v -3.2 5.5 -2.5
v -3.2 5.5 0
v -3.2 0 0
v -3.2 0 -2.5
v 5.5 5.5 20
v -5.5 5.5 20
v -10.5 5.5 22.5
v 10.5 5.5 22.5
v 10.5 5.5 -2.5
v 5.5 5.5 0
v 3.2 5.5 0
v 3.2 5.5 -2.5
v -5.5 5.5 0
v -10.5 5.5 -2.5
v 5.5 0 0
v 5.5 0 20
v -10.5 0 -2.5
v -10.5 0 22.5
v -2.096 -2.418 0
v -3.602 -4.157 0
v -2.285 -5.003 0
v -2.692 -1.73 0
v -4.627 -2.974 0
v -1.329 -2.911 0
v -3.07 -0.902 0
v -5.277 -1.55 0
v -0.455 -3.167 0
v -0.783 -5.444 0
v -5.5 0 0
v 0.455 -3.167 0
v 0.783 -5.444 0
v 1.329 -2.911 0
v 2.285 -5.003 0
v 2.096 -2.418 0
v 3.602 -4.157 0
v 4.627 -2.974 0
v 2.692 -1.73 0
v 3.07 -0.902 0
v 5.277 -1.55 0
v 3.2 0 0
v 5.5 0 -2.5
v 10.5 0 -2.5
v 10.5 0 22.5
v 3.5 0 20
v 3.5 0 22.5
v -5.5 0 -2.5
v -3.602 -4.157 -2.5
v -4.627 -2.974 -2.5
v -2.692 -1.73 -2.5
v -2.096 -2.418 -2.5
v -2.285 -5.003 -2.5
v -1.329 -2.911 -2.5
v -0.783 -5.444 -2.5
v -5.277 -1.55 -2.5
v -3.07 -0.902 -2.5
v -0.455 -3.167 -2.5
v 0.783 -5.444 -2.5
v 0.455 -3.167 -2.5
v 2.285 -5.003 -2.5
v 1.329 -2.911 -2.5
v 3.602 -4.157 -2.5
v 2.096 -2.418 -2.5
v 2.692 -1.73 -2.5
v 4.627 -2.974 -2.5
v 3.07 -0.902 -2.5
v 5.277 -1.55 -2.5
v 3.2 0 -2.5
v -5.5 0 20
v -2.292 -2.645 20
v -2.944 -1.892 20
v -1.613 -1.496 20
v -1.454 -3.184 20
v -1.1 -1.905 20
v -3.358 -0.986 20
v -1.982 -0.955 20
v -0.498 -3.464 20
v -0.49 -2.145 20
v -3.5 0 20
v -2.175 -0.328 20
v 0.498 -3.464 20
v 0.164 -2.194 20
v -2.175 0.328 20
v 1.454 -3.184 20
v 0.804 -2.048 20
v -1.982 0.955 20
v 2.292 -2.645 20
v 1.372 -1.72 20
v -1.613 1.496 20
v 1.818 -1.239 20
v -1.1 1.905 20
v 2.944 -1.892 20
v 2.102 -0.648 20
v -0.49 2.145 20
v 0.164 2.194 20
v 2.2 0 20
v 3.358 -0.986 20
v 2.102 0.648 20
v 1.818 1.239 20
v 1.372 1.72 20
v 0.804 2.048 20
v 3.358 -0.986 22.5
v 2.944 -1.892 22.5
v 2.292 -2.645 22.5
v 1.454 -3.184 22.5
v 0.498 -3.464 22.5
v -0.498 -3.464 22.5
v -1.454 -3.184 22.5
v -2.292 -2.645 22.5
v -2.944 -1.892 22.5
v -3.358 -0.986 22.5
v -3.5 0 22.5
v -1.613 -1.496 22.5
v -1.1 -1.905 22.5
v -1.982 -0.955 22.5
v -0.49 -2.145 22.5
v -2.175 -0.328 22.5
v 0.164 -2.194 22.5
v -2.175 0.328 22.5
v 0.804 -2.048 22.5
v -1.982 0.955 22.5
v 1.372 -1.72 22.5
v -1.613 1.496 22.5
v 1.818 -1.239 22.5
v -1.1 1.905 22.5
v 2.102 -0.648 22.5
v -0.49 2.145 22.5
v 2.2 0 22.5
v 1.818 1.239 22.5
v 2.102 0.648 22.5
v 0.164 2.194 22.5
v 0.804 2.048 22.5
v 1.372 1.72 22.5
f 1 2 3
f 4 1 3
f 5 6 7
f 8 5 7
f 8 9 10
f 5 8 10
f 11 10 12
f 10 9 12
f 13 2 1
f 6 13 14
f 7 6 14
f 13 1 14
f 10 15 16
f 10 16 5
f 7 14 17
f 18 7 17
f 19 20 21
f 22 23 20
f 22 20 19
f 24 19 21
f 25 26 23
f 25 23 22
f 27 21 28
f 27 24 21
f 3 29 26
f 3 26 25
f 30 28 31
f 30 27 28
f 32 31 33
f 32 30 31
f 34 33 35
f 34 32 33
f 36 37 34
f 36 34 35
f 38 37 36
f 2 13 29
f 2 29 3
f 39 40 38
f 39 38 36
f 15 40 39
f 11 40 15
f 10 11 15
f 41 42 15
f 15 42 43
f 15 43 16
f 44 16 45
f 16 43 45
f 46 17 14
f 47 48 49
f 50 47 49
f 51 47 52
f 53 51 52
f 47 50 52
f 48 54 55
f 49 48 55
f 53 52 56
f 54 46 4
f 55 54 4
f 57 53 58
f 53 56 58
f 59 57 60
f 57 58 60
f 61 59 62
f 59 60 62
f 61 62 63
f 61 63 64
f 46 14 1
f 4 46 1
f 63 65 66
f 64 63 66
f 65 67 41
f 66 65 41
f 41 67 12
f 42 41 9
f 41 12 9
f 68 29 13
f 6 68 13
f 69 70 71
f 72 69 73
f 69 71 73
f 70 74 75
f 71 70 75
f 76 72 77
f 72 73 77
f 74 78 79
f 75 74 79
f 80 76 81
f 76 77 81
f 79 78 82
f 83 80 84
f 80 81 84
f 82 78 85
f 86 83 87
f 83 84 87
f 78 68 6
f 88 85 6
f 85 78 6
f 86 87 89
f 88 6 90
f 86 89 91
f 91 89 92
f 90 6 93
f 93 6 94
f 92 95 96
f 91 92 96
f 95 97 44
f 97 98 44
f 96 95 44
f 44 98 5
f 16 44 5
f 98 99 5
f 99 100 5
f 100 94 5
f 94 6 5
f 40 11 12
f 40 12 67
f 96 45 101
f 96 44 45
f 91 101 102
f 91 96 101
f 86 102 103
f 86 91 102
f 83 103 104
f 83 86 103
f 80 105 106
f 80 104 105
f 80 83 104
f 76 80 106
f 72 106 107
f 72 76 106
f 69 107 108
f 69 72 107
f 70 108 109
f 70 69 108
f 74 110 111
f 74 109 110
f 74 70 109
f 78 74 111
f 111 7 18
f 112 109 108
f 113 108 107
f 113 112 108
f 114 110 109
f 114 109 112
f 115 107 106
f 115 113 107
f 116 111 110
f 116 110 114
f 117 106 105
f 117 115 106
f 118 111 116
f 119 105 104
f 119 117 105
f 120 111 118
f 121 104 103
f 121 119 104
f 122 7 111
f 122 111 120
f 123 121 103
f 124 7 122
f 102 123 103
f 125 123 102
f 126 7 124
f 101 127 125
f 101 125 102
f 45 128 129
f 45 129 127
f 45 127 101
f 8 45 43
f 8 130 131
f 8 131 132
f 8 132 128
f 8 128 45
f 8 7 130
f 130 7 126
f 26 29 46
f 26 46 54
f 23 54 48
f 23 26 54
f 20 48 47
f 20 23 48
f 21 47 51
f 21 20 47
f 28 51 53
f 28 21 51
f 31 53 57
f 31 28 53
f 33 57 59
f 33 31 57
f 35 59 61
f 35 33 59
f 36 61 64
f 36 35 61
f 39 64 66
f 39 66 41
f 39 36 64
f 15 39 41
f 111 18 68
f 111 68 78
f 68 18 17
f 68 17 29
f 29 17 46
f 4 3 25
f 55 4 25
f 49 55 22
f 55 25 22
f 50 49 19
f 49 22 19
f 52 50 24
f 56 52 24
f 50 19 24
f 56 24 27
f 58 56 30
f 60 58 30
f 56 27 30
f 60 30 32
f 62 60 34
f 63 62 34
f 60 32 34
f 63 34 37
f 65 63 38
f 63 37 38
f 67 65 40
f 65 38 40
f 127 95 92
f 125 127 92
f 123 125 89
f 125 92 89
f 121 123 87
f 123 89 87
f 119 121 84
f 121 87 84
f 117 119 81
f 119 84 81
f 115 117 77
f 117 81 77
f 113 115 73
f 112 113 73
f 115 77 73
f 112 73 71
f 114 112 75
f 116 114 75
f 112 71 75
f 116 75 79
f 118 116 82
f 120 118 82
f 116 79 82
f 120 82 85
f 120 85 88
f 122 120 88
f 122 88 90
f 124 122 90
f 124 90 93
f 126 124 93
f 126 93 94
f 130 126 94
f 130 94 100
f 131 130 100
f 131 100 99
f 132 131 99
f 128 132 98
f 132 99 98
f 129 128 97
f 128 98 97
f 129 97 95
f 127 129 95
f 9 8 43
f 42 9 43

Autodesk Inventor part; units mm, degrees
ref_plane "YZ Plane" through (0, 0, 0) normal (1, 0, 0) x (0, 1, 0)
ref_plane "XZ Plane" through (0, 0, 0) normal (0, 1, 0) x (-1, 0, 0)
ref_plane "XY Plane" through (0, 0, 0) normal (0, 0, 1) x (1, 0, 0)
sketch "Sketch1" plane through (0, 0, 0) normal (0, 0, 1) x (1, 0, 0)
  arc A0 (-3.2, 0) -> (3.2, 0) centre (0, 0) ccw
  arc A1 (-5.5, 0) -> (5.5, 0) centre (0, 0) ccw
  line L0 (-3.2, 0) -> (-5.5, 0)
  line L1 (-5.5, 0) -> (-5.5, 5.5)
  line L2 (-5.5, 5.5) -> (-3.2, 5.5)
  line L3 (-3.2, 5.5) -> (-3.2, 0)
  line L4 (3.2, 0) -> (5.5, 0)
  line L5 (5.5, 0) -> (5.5, 5.5)
  line L6 (5.5, 5.5) -> (3.2, 5.5)
  line L7 (3.2, 5.5) -> (3.2, 0)
  line L8 (-5.5, 0) -> (-5.5, 5.5)
  line L9 (-5.5, 5.5) -> (-10.5, 5.5)
  line L10 (-10.5, 5.5) -> (-10.5, 0)
  line L11 (-10.5, 0) -> (-5.5, 0)
  line L12 (5.5, 0) -> (5.5, 5.5)
  line L13 (5.5, 5.5) -> (10.5, 5.5)
  line L14 (10.5, 5.5) -> (10.5, 0)
  line L15 (10.5, 0) -> (5.5, 0)
  dimension "d0" = 6.4
  dimension "d1" = 11
  dimension "d2" = 5
  dimension "d3" = 5
extrude "Extr-legs" add sketch "Sketch1" along normal blind 20 contours L11 L10 L9 L1 | L5 L13 L14 L15
extrude "Extr-base" add sketch "Sketch1" against normal blind 2.5
sketch "Sketch2" plane through (0, 0, 20) normal (0, 0, 1) x (1, 0, 0)
  circle A0 centre (0, 0) radius 2.2
  circle A1 centre (0, 0) radius 3.5
  line L0 (5.5, 0) -> (10.5, 0) projected
  line L1 (-10.5, 0) -> (-5.5, 0) projected
  line L2 (-10.5, 0) -> (-10.5, 5.5)
  line L3 (-10.5, 5.5) -> (10.5, 5.5)
  line L4 (10.5, 5.5) -> (10.5, 0)
  line L5 (10.5, 0) -> (2.2, 0)
  line L6 (-2.2, 0) -> (-10.5, 0)
  dimension "d8" = 4.4
  dimension "d9" = 7
extrude "Extr-top" add sketch "Sketch2" along normal blind 2.5 contours L5 A1 L6 A0 | A0 L6 A1 L5 | A1 L6 L1 L2 L3 L4 L0 L5
properties part number "cage2table-mount-M4(top)-M6(bottom)"
